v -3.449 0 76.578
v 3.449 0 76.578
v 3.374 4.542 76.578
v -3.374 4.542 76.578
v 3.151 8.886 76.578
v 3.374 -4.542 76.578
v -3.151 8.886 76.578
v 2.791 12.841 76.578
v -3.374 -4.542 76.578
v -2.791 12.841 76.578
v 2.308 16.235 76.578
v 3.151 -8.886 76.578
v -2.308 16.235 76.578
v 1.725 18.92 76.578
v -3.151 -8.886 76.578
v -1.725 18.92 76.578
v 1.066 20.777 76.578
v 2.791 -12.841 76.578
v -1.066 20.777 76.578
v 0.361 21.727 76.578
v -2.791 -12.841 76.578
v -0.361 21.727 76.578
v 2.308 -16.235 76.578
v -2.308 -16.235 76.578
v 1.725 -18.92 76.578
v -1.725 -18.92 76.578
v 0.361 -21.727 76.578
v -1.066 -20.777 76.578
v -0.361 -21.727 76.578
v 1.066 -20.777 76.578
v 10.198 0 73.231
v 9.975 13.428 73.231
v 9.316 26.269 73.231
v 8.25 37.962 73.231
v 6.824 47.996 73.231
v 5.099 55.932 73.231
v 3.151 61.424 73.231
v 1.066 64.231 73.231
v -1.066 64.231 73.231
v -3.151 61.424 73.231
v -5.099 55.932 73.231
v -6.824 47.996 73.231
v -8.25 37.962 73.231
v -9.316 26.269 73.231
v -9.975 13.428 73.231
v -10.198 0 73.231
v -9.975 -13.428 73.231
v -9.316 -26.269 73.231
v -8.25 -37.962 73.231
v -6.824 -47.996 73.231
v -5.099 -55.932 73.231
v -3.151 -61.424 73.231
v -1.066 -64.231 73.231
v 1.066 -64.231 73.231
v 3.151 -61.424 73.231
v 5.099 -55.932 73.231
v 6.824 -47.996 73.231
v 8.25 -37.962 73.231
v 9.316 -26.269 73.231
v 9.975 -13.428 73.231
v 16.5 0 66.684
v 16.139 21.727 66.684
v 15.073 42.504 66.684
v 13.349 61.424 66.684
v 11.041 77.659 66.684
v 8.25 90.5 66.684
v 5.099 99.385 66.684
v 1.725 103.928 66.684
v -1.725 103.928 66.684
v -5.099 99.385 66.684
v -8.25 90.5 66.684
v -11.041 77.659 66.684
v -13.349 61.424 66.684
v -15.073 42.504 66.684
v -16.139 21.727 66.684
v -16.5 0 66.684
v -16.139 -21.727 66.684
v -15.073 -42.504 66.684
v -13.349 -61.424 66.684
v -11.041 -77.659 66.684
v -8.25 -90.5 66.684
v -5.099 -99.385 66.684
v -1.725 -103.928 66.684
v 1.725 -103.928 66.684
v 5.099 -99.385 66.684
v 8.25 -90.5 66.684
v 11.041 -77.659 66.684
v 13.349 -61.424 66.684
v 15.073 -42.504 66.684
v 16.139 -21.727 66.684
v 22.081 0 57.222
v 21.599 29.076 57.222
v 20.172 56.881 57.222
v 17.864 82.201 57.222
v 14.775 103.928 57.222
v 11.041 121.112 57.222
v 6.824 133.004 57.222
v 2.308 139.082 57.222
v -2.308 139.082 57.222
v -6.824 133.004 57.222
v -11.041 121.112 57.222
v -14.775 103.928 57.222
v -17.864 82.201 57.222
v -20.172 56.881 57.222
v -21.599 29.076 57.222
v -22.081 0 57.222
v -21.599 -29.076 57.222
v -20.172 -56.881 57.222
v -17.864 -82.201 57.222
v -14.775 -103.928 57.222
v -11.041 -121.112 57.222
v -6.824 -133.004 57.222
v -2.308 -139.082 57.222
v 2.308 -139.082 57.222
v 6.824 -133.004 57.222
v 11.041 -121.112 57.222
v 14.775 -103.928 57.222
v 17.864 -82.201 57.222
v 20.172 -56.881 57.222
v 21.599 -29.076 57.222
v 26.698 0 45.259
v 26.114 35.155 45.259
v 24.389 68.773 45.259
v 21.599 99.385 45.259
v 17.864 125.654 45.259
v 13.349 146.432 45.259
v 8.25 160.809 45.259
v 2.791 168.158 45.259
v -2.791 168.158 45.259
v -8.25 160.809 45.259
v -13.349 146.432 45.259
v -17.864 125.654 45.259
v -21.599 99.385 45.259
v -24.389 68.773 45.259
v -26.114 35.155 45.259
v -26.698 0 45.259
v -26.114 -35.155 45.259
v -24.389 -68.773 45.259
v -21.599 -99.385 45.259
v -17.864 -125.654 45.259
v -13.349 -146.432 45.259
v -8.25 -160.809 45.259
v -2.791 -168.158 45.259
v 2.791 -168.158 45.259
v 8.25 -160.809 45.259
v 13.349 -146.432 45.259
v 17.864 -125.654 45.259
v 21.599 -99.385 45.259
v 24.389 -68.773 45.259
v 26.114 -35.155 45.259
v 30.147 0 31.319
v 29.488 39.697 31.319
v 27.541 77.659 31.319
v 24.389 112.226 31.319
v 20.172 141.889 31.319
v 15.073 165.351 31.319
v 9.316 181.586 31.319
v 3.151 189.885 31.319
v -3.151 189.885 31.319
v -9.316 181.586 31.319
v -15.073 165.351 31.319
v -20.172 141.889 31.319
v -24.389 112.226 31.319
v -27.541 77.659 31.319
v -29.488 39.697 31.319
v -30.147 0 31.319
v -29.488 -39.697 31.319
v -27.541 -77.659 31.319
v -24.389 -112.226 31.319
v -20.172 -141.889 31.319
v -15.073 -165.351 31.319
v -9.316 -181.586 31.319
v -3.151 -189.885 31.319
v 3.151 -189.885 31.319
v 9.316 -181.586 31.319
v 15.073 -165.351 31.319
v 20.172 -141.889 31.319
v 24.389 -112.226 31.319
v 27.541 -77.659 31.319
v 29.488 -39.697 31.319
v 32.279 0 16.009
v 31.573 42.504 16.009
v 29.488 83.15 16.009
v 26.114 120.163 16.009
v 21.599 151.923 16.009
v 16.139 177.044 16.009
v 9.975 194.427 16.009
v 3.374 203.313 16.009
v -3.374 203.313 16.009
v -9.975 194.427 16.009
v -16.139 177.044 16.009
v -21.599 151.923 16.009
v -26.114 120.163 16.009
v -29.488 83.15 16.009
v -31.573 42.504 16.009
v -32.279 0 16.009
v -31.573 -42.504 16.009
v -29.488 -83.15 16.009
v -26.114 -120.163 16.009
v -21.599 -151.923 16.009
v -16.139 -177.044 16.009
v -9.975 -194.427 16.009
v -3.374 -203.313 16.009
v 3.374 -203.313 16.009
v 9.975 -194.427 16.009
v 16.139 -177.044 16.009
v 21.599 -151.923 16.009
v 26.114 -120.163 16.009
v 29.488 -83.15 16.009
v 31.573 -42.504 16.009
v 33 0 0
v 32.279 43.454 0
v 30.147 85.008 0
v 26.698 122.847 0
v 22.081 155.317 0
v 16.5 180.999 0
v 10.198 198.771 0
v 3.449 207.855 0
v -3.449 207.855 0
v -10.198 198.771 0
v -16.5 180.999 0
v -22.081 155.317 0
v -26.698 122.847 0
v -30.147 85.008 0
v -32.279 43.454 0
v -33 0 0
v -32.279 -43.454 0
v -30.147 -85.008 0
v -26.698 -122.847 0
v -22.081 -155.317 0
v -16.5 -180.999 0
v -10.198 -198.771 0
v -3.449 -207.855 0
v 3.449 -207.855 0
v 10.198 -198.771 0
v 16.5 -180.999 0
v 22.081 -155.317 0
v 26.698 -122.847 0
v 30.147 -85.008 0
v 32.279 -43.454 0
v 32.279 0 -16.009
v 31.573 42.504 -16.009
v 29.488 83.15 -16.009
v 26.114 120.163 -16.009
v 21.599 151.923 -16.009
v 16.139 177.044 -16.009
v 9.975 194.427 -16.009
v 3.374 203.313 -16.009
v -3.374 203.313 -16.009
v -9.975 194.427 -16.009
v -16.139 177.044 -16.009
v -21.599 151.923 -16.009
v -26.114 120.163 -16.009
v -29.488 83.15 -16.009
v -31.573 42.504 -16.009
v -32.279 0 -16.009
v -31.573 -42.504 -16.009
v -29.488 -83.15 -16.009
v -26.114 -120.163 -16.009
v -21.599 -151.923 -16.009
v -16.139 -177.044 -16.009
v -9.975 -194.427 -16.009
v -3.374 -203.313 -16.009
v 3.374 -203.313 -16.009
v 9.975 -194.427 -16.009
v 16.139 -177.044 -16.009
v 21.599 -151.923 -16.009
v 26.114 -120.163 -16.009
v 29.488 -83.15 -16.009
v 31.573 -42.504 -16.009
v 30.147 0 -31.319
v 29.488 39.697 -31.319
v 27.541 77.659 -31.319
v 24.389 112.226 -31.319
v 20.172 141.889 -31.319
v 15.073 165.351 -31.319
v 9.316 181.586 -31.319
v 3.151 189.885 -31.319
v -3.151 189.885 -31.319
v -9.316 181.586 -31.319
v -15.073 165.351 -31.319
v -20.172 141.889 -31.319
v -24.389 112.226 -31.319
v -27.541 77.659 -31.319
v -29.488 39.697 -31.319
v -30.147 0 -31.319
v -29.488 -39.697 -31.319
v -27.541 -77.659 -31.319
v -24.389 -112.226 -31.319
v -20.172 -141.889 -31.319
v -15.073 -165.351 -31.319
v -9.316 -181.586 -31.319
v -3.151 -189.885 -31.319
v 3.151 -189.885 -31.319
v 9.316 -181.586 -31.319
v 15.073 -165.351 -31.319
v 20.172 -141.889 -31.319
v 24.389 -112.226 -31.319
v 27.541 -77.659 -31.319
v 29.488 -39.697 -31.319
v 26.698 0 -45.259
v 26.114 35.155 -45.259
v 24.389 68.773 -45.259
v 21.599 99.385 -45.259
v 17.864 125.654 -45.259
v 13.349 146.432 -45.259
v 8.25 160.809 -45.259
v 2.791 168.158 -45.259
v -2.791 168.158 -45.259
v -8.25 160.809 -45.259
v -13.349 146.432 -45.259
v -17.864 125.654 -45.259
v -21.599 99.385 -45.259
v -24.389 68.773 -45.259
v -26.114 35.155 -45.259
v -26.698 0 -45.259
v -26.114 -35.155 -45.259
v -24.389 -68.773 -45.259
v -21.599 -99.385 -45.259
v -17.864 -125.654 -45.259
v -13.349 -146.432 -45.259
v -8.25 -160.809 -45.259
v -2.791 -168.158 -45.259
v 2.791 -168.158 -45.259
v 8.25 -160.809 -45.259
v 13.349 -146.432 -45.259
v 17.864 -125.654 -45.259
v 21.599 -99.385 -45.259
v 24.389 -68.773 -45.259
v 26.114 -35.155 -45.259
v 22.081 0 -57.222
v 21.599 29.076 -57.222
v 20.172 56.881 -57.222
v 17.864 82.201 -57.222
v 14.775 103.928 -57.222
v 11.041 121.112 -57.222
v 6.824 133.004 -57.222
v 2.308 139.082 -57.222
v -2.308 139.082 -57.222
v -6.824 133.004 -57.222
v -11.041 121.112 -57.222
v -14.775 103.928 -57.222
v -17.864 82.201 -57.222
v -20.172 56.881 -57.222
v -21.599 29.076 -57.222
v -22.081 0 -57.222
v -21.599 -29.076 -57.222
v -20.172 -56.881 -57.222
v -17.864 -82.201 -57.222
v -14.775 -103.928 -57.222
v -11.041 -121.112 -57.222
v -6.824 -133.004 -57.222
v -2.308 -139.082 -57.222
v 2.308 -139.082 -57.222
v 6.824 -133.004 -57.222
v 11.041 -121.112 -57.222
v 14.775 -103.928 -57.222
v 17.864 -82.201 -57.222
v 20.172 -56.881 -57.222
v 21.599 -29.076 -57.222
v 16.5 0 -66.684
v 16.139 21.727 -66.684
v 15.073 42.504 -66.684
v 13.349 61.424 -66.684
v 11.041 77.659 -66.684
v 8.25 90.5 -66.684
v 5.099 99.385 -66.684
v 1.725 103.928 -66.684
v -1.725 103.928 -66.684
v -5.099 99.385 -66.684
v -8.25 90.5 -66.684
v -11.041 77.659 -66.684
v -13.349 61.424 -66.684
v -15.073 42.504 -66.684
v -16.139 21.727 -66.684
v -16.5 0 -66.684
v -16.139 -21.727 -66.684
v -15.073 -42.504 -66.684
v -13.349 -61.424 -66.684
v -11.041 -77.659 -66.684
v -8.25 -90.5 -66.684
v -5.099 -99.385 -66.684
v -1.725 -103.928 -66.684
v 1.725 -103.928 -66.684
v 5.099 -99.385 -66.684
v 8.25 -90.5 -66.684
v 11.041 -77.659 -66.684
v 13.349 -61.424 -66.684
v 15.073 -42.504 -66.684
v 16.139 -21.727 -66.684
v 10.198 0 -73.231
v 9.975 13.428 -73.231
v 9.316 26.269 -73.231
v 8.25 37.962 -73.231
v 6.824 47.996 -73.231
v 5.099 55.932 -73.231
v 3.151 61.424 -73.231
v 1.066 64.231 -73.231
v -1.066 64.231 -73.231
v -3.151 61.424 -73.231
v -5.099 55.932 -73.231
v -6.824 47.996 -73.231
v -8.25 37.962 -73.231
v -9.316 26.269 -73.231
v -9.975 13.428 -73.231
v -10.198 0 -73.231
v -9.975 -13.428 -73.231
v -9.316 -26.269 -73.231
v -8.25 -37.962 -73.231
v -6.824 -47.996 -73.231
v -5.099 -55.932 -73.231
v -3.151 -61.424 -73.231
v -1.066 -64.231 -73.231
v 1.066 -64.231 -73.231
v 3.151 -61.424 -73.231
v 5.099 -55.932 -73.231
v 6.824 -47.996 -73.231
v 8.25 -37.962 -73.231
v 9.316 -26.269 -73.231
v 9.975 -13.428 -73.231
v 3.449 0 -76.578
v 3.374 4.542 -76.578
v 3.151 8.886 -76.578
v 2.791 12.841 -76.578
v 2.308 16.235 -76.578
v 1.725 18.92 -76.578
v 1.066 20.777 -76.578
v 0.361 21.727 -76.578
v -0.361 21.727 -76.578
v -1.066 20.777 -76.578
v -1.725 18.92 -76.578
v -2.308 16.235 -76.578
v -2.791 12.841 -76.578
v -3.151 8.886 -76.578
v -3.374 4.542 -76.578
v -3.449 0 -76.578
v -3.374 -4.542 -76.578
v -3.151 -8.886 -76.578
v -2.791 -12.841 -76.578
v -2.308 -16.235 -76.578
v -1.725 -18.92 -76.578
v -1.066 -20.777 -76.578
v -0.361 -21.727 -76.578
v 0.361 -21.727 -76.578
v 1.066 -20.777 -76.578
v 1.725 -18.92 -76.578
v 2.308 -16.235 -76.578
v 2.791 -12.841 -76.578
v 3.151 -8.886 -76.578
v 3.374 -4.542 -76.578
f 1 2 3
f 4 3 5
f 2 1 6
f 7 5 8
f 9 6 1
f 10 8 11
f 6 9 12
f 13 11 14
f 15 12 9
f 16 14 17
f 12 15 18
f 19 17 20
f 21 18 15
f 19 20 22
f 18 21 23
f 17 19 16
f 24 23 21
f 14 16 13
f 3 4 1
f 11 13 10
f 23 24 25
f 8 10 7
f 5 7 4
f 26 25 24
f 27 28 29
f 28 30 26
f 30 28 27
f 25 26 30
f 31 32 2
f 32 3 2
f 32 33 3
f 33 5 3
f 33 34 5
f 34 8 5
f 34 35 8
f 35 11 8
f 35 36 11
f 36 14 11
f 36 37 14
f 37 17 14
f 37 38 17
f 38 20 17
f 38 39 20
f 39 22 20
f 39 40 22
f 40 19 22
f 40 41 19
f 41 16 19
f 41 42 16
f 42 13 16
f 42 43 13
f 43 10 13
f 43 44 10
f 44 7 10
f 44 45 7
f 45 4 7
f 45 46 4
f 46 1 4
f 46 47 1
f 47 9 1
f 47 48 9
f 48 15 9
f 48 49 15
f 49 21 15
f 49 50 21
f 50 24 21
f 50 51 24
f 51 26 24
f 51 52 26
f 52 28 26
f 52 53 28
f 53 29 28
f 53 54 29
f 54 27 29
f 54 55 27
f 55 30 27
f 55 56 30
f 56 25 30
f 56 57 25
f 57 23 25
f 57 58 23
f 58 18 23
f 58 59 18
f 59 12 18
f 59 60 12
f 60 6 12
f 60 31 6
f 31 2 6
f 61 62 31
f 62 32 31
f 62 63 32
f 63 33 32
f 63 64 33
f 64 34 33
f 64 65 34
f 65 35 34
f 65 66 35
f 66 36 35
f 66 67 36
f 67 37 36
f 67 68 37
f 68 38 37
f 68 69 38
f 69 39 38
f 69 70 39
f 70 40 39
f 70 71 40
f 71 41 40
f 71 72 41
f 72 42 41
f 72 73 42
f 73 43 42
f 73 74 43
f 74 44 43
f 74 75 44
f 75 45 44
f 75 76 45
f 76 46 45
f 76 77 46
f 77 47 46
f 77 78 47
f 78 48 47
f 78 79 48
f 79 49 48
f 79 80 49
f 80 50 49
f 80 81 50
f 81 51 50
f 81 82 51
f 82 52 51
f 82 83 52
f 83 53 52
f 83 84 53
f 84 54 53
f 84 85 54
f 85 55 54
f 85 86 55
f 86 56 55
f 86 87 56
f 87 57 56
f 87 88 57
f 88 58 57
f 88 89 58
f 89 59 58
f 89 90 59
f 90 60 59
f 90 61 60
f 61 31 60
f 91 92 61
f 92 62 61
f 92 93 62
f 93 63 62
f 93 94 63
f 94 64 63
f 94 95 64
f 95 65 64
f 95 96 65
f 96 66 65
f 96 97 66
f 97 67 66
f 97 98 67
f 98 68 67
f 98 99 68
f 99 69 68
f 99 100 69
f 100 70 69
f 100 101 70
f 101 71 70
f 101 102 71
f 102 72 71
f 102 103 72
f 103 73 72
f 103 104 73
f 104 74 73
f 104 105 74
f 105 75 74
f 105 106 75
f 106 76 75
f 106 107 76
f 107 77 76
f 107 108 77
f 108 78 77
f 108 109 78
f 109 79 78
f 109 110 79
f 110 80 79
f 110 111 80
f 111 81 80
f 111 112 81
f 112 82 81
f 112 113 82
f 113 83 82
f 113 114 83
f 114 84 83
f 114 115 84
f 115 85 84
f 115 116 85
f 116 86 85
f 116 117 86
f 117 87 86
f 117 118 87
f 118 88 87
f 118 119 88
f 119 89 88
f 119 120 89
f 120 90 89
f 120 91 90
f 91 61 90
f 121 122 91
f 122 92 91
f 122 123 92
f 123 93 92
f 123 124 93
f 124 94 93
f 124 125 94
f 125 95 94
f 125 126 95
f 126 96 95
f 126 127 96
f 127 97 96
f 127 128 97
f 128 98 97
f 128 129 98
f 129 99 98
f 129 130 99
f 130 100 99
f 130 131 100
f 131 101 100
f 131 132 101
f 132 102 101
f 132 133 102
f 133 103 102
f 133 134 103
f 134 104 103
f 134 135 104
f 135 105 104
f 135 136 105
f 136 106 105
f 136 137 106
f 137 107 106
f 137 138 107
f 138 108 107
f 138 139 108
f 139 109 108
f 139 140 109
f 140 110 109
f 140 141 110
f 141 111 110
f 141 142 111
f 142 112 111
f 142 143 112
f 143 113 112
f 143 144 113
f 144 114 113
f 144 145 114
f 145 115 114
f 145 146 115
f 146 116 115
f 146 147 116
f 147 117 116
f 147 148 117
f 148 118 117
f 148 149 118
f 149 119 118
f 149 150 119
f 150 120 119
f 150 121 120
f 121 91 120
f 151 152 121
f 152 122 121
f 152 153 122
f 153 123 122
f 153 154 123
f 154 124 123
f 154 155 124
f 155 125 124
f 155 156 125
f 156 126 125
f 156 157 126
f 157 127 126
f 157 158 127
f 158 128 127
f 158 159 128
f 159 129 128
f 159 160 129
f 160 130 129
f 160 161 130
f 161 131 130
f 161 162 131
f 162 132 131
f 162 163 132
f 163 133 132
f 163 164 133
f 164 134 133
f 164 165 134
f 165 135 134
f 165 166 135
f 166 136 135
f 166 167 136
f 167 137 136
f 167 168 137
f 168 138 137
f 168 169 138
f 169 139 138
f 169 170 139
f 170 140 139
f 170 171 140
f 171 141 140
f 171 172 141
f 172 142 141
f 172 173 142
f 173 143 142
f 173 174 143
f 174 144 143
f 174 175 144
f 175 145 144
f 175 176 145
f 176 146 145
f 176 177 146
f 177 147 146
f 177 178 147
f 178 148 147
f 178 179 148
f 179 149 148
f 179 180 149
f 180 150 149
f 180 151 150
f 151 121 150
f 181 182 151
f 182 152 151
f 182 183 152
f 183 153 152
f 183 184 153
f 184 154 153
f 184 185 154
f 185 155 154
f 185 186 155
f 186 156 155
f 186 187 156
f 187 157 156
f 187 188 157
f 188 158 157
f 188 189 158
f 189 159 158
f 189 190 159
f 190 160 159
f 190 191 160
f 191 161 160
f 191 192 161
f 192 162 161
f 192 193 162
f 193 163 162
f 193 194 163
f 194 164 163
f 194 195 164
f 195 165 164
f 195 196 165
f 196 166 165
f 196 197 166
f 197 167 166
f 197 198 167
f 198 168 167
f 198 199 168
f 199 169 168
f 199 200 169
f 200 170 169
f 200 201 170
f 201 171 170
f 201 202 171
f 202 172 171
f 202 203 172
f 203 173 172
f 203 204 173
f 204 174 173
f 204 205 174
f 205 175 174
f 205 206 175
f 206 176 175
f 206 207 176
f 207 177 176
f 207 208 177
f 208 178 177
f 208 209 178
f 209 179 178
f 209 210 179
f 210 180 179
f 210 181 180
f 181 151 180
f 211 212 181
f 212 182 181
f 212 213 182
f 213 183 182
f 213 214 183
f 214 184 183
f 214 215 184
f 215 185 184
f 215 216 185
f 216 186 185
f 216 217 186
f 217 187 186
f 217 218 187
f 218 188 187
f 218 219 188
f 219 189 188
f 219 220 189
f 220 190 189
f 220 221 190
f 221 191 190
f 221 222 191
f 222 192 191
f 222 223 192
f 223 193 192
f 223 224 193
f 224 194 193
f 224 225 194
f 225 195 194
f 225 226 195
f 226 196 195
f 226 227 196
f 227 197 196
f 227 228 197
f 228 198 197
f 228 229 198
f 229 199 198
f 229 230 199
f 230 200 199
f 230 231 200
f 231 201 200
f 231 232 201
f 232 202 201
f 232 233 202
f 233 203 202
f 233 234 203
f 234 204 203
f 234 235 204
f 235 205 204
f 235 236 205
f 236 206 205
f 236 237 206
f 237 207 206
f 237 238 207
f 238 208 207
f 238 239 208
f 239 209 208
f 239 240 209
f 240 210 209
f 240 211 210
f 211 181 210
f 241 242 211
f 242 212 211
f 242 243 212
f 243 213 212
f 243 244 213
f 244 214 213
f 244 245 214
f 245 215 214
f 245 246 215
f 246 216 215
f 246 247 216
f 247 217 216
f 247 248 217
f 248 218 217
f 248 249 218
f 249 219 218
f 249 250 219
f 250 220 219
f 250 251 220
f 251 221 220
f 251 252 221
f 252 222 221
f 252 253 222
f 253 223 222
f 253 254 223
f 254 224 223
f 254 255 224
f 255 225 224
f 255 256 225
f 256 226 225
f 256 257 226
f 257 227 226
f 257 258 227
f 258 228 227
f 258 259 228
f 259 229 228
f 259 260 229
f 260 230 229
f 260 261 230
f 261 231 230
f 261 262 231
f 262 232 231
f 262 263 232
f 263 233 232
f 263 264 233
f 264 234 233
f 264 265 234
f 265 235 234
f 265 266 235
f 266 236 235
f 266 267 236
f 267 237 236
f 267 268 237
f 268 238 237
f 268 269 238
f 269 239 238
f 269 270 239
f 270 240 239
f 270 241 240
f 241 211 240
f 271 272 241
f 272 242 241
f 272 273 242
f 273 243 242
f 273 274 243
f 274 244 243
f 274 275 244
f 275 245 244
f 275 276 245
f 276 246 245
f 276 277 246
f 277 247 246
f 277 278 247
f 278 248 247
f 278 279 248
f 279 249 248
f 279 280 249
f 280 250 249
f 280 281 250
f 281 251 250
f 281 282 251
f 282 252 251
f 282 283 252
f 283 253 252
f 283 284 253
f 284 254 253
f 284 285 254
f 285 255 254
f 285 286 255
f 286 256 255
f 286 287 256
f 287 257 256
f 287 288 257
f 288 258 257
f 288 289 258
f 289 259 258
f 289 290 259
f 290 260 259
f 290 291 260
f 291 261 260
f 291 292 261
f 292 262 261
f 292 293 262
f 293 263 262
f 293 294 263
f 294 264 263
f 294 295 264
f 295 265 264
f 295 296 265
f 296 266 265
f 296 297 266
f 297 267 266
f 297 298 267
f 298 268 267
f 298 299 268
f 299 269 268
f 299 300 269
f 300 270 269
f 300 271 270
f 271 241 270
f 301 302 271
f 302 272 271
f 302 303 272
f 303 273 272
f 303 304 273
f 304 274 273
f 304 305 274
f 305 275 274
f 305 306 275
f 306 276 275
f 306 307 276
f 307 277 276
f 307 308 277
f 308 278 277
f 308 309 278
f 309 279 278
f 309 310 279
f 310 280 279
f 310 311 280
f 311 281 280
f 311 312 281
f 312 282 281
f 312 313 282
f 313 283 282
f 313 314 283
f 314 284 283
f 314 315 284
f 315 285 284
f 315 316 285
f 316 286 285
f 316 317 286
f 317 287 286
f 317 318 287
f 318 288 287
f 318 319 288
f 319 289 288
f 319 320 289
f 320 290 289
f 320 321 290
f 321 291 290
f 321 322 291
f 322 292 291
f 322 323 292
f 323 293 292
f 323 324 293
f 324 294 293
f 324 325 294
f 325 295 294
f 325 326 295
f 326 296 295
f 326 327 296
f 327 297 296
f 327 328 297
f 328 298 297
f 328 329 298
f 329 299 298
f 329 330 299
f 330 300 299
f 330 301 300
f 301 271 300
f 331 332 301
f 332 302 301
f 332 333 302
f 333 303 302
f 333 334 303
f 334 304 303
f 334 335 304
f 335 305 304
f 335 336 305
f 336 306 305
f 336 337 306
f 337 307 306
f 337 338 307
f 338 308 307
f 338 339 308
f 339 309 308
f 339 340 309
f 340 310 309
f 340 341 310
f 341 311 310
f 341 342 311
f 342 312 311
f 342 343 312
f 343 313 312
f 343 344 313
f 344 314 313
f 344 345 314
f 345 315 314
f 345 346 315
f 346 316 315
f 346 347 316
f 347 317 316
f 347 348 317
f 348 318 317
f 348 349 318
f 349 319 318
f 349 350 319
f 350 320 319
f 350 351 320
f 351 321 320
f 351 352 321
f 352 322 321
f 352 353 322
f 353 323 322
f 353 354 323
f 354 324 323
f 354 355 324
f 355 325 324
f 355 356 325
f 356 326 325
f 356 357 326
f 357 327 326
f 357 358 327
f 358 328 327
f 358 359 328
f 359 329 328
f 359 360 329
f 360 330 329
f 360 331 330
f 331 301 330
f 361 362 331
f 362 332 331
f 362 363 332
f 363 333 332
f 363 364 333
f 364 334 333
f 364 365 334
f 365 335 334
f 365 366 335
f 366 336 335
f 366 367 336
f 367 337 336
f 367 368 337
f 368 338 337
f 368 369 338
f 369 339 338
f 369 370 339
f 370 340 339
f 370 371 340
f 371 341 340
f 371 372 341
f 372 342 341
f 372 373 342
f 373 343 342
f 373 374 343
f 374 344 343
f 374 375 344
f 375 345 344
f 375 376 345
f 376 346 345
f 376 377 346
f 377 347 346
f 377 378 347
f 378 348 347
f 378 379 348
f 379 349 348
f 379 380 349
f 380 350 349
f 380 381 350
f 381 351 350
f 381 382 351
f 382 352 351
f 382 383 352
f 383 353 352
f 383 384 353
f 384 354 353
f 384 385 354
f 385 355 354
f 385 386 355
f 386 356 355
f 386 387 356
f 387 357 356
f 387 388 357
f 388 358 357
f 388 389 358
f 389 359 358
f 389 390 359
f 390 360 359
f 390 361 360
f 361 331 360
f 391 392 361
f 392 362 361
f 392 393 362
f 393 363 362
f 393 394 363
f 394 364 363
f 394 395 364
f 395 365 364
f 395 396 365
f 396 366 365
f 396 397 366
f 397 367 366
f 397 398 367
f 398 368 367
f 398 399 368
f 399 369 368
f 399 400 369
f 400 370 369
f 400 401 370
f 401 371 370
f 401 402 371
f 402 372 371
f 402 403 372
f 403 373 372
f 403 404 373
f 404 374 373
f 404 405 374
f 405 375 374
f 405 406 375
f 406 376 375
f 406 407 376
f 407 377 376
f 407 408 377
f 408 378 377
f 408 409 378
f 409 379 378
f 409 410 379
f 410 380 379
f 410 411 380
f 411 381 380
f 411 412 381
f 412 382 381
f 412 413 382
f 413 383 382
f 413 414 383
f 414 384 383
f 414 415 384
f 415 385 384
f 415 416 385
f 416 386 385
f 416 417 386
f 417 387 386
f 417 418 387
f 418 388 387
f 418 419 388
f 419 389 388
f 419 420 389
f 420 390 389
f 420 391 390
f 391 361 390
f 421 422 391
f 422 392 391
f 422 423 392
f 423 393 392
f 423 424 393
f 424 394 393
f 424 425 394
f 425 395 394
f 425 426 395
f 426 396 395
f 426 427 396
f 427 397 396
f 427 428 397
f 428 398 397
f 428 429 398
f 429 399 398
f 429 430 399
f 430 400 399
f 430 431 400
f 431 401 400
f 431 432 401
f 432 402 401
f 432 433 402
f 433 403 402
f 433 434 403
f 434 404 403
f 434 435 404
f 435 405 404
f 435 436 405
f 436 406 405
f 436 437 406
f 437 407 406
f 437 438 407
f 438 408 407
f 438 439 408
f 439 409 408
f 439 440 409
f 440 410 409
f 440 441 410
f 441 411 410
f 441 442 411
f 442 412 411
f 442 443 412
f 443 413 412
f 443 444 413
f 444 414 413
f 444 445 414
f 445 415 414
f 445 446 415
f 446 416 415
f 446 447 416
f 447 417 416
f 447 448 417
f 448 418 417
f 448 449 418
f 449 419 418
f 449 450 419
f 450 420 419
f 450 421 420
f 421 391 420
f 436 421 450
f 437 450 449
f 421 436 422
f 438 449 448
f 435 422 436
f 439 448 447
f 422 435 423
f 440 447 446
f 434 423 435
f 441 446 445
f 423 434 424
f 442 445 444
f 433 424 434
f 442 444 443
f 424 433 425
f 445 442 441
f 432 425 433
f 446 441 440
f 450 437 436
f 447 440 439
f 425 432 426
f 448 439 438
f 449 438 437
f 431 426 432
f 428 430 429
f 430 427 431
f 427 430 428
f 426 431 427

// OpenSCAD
// Generated by SolidPython 1.0.1 on 2020-07-29 00:46:46


scale(v = [3, 19, 7]) {
	sphere(r = 11);
}
/***********************************************
*********      SolidPython code:      **********
************************************************
 
# import packages: SolidPython
from solid import *
from solid.utils import *
from itertools import chain, combinations, permutations


class Resize:

    def __init__(self, scad_file):
        self.scad_file = scad_file
        #self.scad_file = import_scad(scad_file)
        # cone/cylinder param:
        self.r1 = 0
        self.r2 = 0
        self.h = 0
        # rectangular prism param:
        self.w = 0
        self.l = 0
        # ellipse param:
        self.r = 0

    # import OpenScad code (file name corresponds to shape)


    # classify shape + parameters
    def assign(self, param1, param2, param3):
        if self.scad_file == 'cone.scad':
            self.r1 = param1
            self.r2 = param2
            self.h = param3
        elif self.scad_file == 'cylinder.scad':
            self.r1 = param1
            self.r2 = param2
            self.h = param3
        elif self.scad_file == 'rectangularPrism.scad':
            self.h = param1
            self.l = param2
            self.w = param3
        else:
            self.r = param1
            self.h = param2

    # resize parameters
    def iterate(self):
        x = range(3, 20, 2)
        i = 1
        if self.scad_file == 'cone.scad':
            tempList = list(permutations(x, 2))
            for temp in tempList:
                param1 = temp[0]
                param2 = temp[1]
                filepath = 'produced_scad_files/' + 'cone' + str(param1) + '_' + str(param2) + '_' + '.scad'
                scad_render_to_file(cylinder(h=param1, r1=param2, r2=0), filepath)

        elif self.scad_file == 'cylinder.scad':
            tempList = list(permutations(x, 3))
            for temp in tempList:
                param1 = temp[0]
                param2 = temp[1]
                filepath = 'produced_scad_files/' + 'cylinder' + str(param1) + '_' + str(param2) + '_' + '.scad'
                scad_render_to_file(cylinder(h=param1, r1=param2, r2=param2), filepath)

        elif self.scad_file == 'rectangularPrism.scad':
            tempList = list(permutations(x, 3))
            for temp in tempList:
                param1 = temp[0]
                param2 = temp[1]
                param3 = temp[2]
                filepath = 'produced_scad_files/' + 'rectangularPrism' + str(param1) + '_' + str(param2) + '_' + str(
                    param3) + '.scad'
                scad_render_to_file(cube(size=(param1, param2, param3)), filepath)

        elif self.scad_file == 'ellipse.scad':
            tempList = list(permutations(x, 4))
            for temp in tempList:
                param1 = temp[0]
                param2 = temp[1]
                param3 = temp[2]
                param4 = temp[3]
                filepath = 'produced_scad_files/' + 'ellipse' + str(param1) + '_' + str(param2) + '_' + str(param3) + '_' + str(param4) + '.scad'
                scad_render_to_file(scale([param1, param2, param3])(sphere(r=param4)), filepath)

    def render_to_scadfile(self):
        scad_render_to_file(scad, 'example.scad') 
 
************************************************/
